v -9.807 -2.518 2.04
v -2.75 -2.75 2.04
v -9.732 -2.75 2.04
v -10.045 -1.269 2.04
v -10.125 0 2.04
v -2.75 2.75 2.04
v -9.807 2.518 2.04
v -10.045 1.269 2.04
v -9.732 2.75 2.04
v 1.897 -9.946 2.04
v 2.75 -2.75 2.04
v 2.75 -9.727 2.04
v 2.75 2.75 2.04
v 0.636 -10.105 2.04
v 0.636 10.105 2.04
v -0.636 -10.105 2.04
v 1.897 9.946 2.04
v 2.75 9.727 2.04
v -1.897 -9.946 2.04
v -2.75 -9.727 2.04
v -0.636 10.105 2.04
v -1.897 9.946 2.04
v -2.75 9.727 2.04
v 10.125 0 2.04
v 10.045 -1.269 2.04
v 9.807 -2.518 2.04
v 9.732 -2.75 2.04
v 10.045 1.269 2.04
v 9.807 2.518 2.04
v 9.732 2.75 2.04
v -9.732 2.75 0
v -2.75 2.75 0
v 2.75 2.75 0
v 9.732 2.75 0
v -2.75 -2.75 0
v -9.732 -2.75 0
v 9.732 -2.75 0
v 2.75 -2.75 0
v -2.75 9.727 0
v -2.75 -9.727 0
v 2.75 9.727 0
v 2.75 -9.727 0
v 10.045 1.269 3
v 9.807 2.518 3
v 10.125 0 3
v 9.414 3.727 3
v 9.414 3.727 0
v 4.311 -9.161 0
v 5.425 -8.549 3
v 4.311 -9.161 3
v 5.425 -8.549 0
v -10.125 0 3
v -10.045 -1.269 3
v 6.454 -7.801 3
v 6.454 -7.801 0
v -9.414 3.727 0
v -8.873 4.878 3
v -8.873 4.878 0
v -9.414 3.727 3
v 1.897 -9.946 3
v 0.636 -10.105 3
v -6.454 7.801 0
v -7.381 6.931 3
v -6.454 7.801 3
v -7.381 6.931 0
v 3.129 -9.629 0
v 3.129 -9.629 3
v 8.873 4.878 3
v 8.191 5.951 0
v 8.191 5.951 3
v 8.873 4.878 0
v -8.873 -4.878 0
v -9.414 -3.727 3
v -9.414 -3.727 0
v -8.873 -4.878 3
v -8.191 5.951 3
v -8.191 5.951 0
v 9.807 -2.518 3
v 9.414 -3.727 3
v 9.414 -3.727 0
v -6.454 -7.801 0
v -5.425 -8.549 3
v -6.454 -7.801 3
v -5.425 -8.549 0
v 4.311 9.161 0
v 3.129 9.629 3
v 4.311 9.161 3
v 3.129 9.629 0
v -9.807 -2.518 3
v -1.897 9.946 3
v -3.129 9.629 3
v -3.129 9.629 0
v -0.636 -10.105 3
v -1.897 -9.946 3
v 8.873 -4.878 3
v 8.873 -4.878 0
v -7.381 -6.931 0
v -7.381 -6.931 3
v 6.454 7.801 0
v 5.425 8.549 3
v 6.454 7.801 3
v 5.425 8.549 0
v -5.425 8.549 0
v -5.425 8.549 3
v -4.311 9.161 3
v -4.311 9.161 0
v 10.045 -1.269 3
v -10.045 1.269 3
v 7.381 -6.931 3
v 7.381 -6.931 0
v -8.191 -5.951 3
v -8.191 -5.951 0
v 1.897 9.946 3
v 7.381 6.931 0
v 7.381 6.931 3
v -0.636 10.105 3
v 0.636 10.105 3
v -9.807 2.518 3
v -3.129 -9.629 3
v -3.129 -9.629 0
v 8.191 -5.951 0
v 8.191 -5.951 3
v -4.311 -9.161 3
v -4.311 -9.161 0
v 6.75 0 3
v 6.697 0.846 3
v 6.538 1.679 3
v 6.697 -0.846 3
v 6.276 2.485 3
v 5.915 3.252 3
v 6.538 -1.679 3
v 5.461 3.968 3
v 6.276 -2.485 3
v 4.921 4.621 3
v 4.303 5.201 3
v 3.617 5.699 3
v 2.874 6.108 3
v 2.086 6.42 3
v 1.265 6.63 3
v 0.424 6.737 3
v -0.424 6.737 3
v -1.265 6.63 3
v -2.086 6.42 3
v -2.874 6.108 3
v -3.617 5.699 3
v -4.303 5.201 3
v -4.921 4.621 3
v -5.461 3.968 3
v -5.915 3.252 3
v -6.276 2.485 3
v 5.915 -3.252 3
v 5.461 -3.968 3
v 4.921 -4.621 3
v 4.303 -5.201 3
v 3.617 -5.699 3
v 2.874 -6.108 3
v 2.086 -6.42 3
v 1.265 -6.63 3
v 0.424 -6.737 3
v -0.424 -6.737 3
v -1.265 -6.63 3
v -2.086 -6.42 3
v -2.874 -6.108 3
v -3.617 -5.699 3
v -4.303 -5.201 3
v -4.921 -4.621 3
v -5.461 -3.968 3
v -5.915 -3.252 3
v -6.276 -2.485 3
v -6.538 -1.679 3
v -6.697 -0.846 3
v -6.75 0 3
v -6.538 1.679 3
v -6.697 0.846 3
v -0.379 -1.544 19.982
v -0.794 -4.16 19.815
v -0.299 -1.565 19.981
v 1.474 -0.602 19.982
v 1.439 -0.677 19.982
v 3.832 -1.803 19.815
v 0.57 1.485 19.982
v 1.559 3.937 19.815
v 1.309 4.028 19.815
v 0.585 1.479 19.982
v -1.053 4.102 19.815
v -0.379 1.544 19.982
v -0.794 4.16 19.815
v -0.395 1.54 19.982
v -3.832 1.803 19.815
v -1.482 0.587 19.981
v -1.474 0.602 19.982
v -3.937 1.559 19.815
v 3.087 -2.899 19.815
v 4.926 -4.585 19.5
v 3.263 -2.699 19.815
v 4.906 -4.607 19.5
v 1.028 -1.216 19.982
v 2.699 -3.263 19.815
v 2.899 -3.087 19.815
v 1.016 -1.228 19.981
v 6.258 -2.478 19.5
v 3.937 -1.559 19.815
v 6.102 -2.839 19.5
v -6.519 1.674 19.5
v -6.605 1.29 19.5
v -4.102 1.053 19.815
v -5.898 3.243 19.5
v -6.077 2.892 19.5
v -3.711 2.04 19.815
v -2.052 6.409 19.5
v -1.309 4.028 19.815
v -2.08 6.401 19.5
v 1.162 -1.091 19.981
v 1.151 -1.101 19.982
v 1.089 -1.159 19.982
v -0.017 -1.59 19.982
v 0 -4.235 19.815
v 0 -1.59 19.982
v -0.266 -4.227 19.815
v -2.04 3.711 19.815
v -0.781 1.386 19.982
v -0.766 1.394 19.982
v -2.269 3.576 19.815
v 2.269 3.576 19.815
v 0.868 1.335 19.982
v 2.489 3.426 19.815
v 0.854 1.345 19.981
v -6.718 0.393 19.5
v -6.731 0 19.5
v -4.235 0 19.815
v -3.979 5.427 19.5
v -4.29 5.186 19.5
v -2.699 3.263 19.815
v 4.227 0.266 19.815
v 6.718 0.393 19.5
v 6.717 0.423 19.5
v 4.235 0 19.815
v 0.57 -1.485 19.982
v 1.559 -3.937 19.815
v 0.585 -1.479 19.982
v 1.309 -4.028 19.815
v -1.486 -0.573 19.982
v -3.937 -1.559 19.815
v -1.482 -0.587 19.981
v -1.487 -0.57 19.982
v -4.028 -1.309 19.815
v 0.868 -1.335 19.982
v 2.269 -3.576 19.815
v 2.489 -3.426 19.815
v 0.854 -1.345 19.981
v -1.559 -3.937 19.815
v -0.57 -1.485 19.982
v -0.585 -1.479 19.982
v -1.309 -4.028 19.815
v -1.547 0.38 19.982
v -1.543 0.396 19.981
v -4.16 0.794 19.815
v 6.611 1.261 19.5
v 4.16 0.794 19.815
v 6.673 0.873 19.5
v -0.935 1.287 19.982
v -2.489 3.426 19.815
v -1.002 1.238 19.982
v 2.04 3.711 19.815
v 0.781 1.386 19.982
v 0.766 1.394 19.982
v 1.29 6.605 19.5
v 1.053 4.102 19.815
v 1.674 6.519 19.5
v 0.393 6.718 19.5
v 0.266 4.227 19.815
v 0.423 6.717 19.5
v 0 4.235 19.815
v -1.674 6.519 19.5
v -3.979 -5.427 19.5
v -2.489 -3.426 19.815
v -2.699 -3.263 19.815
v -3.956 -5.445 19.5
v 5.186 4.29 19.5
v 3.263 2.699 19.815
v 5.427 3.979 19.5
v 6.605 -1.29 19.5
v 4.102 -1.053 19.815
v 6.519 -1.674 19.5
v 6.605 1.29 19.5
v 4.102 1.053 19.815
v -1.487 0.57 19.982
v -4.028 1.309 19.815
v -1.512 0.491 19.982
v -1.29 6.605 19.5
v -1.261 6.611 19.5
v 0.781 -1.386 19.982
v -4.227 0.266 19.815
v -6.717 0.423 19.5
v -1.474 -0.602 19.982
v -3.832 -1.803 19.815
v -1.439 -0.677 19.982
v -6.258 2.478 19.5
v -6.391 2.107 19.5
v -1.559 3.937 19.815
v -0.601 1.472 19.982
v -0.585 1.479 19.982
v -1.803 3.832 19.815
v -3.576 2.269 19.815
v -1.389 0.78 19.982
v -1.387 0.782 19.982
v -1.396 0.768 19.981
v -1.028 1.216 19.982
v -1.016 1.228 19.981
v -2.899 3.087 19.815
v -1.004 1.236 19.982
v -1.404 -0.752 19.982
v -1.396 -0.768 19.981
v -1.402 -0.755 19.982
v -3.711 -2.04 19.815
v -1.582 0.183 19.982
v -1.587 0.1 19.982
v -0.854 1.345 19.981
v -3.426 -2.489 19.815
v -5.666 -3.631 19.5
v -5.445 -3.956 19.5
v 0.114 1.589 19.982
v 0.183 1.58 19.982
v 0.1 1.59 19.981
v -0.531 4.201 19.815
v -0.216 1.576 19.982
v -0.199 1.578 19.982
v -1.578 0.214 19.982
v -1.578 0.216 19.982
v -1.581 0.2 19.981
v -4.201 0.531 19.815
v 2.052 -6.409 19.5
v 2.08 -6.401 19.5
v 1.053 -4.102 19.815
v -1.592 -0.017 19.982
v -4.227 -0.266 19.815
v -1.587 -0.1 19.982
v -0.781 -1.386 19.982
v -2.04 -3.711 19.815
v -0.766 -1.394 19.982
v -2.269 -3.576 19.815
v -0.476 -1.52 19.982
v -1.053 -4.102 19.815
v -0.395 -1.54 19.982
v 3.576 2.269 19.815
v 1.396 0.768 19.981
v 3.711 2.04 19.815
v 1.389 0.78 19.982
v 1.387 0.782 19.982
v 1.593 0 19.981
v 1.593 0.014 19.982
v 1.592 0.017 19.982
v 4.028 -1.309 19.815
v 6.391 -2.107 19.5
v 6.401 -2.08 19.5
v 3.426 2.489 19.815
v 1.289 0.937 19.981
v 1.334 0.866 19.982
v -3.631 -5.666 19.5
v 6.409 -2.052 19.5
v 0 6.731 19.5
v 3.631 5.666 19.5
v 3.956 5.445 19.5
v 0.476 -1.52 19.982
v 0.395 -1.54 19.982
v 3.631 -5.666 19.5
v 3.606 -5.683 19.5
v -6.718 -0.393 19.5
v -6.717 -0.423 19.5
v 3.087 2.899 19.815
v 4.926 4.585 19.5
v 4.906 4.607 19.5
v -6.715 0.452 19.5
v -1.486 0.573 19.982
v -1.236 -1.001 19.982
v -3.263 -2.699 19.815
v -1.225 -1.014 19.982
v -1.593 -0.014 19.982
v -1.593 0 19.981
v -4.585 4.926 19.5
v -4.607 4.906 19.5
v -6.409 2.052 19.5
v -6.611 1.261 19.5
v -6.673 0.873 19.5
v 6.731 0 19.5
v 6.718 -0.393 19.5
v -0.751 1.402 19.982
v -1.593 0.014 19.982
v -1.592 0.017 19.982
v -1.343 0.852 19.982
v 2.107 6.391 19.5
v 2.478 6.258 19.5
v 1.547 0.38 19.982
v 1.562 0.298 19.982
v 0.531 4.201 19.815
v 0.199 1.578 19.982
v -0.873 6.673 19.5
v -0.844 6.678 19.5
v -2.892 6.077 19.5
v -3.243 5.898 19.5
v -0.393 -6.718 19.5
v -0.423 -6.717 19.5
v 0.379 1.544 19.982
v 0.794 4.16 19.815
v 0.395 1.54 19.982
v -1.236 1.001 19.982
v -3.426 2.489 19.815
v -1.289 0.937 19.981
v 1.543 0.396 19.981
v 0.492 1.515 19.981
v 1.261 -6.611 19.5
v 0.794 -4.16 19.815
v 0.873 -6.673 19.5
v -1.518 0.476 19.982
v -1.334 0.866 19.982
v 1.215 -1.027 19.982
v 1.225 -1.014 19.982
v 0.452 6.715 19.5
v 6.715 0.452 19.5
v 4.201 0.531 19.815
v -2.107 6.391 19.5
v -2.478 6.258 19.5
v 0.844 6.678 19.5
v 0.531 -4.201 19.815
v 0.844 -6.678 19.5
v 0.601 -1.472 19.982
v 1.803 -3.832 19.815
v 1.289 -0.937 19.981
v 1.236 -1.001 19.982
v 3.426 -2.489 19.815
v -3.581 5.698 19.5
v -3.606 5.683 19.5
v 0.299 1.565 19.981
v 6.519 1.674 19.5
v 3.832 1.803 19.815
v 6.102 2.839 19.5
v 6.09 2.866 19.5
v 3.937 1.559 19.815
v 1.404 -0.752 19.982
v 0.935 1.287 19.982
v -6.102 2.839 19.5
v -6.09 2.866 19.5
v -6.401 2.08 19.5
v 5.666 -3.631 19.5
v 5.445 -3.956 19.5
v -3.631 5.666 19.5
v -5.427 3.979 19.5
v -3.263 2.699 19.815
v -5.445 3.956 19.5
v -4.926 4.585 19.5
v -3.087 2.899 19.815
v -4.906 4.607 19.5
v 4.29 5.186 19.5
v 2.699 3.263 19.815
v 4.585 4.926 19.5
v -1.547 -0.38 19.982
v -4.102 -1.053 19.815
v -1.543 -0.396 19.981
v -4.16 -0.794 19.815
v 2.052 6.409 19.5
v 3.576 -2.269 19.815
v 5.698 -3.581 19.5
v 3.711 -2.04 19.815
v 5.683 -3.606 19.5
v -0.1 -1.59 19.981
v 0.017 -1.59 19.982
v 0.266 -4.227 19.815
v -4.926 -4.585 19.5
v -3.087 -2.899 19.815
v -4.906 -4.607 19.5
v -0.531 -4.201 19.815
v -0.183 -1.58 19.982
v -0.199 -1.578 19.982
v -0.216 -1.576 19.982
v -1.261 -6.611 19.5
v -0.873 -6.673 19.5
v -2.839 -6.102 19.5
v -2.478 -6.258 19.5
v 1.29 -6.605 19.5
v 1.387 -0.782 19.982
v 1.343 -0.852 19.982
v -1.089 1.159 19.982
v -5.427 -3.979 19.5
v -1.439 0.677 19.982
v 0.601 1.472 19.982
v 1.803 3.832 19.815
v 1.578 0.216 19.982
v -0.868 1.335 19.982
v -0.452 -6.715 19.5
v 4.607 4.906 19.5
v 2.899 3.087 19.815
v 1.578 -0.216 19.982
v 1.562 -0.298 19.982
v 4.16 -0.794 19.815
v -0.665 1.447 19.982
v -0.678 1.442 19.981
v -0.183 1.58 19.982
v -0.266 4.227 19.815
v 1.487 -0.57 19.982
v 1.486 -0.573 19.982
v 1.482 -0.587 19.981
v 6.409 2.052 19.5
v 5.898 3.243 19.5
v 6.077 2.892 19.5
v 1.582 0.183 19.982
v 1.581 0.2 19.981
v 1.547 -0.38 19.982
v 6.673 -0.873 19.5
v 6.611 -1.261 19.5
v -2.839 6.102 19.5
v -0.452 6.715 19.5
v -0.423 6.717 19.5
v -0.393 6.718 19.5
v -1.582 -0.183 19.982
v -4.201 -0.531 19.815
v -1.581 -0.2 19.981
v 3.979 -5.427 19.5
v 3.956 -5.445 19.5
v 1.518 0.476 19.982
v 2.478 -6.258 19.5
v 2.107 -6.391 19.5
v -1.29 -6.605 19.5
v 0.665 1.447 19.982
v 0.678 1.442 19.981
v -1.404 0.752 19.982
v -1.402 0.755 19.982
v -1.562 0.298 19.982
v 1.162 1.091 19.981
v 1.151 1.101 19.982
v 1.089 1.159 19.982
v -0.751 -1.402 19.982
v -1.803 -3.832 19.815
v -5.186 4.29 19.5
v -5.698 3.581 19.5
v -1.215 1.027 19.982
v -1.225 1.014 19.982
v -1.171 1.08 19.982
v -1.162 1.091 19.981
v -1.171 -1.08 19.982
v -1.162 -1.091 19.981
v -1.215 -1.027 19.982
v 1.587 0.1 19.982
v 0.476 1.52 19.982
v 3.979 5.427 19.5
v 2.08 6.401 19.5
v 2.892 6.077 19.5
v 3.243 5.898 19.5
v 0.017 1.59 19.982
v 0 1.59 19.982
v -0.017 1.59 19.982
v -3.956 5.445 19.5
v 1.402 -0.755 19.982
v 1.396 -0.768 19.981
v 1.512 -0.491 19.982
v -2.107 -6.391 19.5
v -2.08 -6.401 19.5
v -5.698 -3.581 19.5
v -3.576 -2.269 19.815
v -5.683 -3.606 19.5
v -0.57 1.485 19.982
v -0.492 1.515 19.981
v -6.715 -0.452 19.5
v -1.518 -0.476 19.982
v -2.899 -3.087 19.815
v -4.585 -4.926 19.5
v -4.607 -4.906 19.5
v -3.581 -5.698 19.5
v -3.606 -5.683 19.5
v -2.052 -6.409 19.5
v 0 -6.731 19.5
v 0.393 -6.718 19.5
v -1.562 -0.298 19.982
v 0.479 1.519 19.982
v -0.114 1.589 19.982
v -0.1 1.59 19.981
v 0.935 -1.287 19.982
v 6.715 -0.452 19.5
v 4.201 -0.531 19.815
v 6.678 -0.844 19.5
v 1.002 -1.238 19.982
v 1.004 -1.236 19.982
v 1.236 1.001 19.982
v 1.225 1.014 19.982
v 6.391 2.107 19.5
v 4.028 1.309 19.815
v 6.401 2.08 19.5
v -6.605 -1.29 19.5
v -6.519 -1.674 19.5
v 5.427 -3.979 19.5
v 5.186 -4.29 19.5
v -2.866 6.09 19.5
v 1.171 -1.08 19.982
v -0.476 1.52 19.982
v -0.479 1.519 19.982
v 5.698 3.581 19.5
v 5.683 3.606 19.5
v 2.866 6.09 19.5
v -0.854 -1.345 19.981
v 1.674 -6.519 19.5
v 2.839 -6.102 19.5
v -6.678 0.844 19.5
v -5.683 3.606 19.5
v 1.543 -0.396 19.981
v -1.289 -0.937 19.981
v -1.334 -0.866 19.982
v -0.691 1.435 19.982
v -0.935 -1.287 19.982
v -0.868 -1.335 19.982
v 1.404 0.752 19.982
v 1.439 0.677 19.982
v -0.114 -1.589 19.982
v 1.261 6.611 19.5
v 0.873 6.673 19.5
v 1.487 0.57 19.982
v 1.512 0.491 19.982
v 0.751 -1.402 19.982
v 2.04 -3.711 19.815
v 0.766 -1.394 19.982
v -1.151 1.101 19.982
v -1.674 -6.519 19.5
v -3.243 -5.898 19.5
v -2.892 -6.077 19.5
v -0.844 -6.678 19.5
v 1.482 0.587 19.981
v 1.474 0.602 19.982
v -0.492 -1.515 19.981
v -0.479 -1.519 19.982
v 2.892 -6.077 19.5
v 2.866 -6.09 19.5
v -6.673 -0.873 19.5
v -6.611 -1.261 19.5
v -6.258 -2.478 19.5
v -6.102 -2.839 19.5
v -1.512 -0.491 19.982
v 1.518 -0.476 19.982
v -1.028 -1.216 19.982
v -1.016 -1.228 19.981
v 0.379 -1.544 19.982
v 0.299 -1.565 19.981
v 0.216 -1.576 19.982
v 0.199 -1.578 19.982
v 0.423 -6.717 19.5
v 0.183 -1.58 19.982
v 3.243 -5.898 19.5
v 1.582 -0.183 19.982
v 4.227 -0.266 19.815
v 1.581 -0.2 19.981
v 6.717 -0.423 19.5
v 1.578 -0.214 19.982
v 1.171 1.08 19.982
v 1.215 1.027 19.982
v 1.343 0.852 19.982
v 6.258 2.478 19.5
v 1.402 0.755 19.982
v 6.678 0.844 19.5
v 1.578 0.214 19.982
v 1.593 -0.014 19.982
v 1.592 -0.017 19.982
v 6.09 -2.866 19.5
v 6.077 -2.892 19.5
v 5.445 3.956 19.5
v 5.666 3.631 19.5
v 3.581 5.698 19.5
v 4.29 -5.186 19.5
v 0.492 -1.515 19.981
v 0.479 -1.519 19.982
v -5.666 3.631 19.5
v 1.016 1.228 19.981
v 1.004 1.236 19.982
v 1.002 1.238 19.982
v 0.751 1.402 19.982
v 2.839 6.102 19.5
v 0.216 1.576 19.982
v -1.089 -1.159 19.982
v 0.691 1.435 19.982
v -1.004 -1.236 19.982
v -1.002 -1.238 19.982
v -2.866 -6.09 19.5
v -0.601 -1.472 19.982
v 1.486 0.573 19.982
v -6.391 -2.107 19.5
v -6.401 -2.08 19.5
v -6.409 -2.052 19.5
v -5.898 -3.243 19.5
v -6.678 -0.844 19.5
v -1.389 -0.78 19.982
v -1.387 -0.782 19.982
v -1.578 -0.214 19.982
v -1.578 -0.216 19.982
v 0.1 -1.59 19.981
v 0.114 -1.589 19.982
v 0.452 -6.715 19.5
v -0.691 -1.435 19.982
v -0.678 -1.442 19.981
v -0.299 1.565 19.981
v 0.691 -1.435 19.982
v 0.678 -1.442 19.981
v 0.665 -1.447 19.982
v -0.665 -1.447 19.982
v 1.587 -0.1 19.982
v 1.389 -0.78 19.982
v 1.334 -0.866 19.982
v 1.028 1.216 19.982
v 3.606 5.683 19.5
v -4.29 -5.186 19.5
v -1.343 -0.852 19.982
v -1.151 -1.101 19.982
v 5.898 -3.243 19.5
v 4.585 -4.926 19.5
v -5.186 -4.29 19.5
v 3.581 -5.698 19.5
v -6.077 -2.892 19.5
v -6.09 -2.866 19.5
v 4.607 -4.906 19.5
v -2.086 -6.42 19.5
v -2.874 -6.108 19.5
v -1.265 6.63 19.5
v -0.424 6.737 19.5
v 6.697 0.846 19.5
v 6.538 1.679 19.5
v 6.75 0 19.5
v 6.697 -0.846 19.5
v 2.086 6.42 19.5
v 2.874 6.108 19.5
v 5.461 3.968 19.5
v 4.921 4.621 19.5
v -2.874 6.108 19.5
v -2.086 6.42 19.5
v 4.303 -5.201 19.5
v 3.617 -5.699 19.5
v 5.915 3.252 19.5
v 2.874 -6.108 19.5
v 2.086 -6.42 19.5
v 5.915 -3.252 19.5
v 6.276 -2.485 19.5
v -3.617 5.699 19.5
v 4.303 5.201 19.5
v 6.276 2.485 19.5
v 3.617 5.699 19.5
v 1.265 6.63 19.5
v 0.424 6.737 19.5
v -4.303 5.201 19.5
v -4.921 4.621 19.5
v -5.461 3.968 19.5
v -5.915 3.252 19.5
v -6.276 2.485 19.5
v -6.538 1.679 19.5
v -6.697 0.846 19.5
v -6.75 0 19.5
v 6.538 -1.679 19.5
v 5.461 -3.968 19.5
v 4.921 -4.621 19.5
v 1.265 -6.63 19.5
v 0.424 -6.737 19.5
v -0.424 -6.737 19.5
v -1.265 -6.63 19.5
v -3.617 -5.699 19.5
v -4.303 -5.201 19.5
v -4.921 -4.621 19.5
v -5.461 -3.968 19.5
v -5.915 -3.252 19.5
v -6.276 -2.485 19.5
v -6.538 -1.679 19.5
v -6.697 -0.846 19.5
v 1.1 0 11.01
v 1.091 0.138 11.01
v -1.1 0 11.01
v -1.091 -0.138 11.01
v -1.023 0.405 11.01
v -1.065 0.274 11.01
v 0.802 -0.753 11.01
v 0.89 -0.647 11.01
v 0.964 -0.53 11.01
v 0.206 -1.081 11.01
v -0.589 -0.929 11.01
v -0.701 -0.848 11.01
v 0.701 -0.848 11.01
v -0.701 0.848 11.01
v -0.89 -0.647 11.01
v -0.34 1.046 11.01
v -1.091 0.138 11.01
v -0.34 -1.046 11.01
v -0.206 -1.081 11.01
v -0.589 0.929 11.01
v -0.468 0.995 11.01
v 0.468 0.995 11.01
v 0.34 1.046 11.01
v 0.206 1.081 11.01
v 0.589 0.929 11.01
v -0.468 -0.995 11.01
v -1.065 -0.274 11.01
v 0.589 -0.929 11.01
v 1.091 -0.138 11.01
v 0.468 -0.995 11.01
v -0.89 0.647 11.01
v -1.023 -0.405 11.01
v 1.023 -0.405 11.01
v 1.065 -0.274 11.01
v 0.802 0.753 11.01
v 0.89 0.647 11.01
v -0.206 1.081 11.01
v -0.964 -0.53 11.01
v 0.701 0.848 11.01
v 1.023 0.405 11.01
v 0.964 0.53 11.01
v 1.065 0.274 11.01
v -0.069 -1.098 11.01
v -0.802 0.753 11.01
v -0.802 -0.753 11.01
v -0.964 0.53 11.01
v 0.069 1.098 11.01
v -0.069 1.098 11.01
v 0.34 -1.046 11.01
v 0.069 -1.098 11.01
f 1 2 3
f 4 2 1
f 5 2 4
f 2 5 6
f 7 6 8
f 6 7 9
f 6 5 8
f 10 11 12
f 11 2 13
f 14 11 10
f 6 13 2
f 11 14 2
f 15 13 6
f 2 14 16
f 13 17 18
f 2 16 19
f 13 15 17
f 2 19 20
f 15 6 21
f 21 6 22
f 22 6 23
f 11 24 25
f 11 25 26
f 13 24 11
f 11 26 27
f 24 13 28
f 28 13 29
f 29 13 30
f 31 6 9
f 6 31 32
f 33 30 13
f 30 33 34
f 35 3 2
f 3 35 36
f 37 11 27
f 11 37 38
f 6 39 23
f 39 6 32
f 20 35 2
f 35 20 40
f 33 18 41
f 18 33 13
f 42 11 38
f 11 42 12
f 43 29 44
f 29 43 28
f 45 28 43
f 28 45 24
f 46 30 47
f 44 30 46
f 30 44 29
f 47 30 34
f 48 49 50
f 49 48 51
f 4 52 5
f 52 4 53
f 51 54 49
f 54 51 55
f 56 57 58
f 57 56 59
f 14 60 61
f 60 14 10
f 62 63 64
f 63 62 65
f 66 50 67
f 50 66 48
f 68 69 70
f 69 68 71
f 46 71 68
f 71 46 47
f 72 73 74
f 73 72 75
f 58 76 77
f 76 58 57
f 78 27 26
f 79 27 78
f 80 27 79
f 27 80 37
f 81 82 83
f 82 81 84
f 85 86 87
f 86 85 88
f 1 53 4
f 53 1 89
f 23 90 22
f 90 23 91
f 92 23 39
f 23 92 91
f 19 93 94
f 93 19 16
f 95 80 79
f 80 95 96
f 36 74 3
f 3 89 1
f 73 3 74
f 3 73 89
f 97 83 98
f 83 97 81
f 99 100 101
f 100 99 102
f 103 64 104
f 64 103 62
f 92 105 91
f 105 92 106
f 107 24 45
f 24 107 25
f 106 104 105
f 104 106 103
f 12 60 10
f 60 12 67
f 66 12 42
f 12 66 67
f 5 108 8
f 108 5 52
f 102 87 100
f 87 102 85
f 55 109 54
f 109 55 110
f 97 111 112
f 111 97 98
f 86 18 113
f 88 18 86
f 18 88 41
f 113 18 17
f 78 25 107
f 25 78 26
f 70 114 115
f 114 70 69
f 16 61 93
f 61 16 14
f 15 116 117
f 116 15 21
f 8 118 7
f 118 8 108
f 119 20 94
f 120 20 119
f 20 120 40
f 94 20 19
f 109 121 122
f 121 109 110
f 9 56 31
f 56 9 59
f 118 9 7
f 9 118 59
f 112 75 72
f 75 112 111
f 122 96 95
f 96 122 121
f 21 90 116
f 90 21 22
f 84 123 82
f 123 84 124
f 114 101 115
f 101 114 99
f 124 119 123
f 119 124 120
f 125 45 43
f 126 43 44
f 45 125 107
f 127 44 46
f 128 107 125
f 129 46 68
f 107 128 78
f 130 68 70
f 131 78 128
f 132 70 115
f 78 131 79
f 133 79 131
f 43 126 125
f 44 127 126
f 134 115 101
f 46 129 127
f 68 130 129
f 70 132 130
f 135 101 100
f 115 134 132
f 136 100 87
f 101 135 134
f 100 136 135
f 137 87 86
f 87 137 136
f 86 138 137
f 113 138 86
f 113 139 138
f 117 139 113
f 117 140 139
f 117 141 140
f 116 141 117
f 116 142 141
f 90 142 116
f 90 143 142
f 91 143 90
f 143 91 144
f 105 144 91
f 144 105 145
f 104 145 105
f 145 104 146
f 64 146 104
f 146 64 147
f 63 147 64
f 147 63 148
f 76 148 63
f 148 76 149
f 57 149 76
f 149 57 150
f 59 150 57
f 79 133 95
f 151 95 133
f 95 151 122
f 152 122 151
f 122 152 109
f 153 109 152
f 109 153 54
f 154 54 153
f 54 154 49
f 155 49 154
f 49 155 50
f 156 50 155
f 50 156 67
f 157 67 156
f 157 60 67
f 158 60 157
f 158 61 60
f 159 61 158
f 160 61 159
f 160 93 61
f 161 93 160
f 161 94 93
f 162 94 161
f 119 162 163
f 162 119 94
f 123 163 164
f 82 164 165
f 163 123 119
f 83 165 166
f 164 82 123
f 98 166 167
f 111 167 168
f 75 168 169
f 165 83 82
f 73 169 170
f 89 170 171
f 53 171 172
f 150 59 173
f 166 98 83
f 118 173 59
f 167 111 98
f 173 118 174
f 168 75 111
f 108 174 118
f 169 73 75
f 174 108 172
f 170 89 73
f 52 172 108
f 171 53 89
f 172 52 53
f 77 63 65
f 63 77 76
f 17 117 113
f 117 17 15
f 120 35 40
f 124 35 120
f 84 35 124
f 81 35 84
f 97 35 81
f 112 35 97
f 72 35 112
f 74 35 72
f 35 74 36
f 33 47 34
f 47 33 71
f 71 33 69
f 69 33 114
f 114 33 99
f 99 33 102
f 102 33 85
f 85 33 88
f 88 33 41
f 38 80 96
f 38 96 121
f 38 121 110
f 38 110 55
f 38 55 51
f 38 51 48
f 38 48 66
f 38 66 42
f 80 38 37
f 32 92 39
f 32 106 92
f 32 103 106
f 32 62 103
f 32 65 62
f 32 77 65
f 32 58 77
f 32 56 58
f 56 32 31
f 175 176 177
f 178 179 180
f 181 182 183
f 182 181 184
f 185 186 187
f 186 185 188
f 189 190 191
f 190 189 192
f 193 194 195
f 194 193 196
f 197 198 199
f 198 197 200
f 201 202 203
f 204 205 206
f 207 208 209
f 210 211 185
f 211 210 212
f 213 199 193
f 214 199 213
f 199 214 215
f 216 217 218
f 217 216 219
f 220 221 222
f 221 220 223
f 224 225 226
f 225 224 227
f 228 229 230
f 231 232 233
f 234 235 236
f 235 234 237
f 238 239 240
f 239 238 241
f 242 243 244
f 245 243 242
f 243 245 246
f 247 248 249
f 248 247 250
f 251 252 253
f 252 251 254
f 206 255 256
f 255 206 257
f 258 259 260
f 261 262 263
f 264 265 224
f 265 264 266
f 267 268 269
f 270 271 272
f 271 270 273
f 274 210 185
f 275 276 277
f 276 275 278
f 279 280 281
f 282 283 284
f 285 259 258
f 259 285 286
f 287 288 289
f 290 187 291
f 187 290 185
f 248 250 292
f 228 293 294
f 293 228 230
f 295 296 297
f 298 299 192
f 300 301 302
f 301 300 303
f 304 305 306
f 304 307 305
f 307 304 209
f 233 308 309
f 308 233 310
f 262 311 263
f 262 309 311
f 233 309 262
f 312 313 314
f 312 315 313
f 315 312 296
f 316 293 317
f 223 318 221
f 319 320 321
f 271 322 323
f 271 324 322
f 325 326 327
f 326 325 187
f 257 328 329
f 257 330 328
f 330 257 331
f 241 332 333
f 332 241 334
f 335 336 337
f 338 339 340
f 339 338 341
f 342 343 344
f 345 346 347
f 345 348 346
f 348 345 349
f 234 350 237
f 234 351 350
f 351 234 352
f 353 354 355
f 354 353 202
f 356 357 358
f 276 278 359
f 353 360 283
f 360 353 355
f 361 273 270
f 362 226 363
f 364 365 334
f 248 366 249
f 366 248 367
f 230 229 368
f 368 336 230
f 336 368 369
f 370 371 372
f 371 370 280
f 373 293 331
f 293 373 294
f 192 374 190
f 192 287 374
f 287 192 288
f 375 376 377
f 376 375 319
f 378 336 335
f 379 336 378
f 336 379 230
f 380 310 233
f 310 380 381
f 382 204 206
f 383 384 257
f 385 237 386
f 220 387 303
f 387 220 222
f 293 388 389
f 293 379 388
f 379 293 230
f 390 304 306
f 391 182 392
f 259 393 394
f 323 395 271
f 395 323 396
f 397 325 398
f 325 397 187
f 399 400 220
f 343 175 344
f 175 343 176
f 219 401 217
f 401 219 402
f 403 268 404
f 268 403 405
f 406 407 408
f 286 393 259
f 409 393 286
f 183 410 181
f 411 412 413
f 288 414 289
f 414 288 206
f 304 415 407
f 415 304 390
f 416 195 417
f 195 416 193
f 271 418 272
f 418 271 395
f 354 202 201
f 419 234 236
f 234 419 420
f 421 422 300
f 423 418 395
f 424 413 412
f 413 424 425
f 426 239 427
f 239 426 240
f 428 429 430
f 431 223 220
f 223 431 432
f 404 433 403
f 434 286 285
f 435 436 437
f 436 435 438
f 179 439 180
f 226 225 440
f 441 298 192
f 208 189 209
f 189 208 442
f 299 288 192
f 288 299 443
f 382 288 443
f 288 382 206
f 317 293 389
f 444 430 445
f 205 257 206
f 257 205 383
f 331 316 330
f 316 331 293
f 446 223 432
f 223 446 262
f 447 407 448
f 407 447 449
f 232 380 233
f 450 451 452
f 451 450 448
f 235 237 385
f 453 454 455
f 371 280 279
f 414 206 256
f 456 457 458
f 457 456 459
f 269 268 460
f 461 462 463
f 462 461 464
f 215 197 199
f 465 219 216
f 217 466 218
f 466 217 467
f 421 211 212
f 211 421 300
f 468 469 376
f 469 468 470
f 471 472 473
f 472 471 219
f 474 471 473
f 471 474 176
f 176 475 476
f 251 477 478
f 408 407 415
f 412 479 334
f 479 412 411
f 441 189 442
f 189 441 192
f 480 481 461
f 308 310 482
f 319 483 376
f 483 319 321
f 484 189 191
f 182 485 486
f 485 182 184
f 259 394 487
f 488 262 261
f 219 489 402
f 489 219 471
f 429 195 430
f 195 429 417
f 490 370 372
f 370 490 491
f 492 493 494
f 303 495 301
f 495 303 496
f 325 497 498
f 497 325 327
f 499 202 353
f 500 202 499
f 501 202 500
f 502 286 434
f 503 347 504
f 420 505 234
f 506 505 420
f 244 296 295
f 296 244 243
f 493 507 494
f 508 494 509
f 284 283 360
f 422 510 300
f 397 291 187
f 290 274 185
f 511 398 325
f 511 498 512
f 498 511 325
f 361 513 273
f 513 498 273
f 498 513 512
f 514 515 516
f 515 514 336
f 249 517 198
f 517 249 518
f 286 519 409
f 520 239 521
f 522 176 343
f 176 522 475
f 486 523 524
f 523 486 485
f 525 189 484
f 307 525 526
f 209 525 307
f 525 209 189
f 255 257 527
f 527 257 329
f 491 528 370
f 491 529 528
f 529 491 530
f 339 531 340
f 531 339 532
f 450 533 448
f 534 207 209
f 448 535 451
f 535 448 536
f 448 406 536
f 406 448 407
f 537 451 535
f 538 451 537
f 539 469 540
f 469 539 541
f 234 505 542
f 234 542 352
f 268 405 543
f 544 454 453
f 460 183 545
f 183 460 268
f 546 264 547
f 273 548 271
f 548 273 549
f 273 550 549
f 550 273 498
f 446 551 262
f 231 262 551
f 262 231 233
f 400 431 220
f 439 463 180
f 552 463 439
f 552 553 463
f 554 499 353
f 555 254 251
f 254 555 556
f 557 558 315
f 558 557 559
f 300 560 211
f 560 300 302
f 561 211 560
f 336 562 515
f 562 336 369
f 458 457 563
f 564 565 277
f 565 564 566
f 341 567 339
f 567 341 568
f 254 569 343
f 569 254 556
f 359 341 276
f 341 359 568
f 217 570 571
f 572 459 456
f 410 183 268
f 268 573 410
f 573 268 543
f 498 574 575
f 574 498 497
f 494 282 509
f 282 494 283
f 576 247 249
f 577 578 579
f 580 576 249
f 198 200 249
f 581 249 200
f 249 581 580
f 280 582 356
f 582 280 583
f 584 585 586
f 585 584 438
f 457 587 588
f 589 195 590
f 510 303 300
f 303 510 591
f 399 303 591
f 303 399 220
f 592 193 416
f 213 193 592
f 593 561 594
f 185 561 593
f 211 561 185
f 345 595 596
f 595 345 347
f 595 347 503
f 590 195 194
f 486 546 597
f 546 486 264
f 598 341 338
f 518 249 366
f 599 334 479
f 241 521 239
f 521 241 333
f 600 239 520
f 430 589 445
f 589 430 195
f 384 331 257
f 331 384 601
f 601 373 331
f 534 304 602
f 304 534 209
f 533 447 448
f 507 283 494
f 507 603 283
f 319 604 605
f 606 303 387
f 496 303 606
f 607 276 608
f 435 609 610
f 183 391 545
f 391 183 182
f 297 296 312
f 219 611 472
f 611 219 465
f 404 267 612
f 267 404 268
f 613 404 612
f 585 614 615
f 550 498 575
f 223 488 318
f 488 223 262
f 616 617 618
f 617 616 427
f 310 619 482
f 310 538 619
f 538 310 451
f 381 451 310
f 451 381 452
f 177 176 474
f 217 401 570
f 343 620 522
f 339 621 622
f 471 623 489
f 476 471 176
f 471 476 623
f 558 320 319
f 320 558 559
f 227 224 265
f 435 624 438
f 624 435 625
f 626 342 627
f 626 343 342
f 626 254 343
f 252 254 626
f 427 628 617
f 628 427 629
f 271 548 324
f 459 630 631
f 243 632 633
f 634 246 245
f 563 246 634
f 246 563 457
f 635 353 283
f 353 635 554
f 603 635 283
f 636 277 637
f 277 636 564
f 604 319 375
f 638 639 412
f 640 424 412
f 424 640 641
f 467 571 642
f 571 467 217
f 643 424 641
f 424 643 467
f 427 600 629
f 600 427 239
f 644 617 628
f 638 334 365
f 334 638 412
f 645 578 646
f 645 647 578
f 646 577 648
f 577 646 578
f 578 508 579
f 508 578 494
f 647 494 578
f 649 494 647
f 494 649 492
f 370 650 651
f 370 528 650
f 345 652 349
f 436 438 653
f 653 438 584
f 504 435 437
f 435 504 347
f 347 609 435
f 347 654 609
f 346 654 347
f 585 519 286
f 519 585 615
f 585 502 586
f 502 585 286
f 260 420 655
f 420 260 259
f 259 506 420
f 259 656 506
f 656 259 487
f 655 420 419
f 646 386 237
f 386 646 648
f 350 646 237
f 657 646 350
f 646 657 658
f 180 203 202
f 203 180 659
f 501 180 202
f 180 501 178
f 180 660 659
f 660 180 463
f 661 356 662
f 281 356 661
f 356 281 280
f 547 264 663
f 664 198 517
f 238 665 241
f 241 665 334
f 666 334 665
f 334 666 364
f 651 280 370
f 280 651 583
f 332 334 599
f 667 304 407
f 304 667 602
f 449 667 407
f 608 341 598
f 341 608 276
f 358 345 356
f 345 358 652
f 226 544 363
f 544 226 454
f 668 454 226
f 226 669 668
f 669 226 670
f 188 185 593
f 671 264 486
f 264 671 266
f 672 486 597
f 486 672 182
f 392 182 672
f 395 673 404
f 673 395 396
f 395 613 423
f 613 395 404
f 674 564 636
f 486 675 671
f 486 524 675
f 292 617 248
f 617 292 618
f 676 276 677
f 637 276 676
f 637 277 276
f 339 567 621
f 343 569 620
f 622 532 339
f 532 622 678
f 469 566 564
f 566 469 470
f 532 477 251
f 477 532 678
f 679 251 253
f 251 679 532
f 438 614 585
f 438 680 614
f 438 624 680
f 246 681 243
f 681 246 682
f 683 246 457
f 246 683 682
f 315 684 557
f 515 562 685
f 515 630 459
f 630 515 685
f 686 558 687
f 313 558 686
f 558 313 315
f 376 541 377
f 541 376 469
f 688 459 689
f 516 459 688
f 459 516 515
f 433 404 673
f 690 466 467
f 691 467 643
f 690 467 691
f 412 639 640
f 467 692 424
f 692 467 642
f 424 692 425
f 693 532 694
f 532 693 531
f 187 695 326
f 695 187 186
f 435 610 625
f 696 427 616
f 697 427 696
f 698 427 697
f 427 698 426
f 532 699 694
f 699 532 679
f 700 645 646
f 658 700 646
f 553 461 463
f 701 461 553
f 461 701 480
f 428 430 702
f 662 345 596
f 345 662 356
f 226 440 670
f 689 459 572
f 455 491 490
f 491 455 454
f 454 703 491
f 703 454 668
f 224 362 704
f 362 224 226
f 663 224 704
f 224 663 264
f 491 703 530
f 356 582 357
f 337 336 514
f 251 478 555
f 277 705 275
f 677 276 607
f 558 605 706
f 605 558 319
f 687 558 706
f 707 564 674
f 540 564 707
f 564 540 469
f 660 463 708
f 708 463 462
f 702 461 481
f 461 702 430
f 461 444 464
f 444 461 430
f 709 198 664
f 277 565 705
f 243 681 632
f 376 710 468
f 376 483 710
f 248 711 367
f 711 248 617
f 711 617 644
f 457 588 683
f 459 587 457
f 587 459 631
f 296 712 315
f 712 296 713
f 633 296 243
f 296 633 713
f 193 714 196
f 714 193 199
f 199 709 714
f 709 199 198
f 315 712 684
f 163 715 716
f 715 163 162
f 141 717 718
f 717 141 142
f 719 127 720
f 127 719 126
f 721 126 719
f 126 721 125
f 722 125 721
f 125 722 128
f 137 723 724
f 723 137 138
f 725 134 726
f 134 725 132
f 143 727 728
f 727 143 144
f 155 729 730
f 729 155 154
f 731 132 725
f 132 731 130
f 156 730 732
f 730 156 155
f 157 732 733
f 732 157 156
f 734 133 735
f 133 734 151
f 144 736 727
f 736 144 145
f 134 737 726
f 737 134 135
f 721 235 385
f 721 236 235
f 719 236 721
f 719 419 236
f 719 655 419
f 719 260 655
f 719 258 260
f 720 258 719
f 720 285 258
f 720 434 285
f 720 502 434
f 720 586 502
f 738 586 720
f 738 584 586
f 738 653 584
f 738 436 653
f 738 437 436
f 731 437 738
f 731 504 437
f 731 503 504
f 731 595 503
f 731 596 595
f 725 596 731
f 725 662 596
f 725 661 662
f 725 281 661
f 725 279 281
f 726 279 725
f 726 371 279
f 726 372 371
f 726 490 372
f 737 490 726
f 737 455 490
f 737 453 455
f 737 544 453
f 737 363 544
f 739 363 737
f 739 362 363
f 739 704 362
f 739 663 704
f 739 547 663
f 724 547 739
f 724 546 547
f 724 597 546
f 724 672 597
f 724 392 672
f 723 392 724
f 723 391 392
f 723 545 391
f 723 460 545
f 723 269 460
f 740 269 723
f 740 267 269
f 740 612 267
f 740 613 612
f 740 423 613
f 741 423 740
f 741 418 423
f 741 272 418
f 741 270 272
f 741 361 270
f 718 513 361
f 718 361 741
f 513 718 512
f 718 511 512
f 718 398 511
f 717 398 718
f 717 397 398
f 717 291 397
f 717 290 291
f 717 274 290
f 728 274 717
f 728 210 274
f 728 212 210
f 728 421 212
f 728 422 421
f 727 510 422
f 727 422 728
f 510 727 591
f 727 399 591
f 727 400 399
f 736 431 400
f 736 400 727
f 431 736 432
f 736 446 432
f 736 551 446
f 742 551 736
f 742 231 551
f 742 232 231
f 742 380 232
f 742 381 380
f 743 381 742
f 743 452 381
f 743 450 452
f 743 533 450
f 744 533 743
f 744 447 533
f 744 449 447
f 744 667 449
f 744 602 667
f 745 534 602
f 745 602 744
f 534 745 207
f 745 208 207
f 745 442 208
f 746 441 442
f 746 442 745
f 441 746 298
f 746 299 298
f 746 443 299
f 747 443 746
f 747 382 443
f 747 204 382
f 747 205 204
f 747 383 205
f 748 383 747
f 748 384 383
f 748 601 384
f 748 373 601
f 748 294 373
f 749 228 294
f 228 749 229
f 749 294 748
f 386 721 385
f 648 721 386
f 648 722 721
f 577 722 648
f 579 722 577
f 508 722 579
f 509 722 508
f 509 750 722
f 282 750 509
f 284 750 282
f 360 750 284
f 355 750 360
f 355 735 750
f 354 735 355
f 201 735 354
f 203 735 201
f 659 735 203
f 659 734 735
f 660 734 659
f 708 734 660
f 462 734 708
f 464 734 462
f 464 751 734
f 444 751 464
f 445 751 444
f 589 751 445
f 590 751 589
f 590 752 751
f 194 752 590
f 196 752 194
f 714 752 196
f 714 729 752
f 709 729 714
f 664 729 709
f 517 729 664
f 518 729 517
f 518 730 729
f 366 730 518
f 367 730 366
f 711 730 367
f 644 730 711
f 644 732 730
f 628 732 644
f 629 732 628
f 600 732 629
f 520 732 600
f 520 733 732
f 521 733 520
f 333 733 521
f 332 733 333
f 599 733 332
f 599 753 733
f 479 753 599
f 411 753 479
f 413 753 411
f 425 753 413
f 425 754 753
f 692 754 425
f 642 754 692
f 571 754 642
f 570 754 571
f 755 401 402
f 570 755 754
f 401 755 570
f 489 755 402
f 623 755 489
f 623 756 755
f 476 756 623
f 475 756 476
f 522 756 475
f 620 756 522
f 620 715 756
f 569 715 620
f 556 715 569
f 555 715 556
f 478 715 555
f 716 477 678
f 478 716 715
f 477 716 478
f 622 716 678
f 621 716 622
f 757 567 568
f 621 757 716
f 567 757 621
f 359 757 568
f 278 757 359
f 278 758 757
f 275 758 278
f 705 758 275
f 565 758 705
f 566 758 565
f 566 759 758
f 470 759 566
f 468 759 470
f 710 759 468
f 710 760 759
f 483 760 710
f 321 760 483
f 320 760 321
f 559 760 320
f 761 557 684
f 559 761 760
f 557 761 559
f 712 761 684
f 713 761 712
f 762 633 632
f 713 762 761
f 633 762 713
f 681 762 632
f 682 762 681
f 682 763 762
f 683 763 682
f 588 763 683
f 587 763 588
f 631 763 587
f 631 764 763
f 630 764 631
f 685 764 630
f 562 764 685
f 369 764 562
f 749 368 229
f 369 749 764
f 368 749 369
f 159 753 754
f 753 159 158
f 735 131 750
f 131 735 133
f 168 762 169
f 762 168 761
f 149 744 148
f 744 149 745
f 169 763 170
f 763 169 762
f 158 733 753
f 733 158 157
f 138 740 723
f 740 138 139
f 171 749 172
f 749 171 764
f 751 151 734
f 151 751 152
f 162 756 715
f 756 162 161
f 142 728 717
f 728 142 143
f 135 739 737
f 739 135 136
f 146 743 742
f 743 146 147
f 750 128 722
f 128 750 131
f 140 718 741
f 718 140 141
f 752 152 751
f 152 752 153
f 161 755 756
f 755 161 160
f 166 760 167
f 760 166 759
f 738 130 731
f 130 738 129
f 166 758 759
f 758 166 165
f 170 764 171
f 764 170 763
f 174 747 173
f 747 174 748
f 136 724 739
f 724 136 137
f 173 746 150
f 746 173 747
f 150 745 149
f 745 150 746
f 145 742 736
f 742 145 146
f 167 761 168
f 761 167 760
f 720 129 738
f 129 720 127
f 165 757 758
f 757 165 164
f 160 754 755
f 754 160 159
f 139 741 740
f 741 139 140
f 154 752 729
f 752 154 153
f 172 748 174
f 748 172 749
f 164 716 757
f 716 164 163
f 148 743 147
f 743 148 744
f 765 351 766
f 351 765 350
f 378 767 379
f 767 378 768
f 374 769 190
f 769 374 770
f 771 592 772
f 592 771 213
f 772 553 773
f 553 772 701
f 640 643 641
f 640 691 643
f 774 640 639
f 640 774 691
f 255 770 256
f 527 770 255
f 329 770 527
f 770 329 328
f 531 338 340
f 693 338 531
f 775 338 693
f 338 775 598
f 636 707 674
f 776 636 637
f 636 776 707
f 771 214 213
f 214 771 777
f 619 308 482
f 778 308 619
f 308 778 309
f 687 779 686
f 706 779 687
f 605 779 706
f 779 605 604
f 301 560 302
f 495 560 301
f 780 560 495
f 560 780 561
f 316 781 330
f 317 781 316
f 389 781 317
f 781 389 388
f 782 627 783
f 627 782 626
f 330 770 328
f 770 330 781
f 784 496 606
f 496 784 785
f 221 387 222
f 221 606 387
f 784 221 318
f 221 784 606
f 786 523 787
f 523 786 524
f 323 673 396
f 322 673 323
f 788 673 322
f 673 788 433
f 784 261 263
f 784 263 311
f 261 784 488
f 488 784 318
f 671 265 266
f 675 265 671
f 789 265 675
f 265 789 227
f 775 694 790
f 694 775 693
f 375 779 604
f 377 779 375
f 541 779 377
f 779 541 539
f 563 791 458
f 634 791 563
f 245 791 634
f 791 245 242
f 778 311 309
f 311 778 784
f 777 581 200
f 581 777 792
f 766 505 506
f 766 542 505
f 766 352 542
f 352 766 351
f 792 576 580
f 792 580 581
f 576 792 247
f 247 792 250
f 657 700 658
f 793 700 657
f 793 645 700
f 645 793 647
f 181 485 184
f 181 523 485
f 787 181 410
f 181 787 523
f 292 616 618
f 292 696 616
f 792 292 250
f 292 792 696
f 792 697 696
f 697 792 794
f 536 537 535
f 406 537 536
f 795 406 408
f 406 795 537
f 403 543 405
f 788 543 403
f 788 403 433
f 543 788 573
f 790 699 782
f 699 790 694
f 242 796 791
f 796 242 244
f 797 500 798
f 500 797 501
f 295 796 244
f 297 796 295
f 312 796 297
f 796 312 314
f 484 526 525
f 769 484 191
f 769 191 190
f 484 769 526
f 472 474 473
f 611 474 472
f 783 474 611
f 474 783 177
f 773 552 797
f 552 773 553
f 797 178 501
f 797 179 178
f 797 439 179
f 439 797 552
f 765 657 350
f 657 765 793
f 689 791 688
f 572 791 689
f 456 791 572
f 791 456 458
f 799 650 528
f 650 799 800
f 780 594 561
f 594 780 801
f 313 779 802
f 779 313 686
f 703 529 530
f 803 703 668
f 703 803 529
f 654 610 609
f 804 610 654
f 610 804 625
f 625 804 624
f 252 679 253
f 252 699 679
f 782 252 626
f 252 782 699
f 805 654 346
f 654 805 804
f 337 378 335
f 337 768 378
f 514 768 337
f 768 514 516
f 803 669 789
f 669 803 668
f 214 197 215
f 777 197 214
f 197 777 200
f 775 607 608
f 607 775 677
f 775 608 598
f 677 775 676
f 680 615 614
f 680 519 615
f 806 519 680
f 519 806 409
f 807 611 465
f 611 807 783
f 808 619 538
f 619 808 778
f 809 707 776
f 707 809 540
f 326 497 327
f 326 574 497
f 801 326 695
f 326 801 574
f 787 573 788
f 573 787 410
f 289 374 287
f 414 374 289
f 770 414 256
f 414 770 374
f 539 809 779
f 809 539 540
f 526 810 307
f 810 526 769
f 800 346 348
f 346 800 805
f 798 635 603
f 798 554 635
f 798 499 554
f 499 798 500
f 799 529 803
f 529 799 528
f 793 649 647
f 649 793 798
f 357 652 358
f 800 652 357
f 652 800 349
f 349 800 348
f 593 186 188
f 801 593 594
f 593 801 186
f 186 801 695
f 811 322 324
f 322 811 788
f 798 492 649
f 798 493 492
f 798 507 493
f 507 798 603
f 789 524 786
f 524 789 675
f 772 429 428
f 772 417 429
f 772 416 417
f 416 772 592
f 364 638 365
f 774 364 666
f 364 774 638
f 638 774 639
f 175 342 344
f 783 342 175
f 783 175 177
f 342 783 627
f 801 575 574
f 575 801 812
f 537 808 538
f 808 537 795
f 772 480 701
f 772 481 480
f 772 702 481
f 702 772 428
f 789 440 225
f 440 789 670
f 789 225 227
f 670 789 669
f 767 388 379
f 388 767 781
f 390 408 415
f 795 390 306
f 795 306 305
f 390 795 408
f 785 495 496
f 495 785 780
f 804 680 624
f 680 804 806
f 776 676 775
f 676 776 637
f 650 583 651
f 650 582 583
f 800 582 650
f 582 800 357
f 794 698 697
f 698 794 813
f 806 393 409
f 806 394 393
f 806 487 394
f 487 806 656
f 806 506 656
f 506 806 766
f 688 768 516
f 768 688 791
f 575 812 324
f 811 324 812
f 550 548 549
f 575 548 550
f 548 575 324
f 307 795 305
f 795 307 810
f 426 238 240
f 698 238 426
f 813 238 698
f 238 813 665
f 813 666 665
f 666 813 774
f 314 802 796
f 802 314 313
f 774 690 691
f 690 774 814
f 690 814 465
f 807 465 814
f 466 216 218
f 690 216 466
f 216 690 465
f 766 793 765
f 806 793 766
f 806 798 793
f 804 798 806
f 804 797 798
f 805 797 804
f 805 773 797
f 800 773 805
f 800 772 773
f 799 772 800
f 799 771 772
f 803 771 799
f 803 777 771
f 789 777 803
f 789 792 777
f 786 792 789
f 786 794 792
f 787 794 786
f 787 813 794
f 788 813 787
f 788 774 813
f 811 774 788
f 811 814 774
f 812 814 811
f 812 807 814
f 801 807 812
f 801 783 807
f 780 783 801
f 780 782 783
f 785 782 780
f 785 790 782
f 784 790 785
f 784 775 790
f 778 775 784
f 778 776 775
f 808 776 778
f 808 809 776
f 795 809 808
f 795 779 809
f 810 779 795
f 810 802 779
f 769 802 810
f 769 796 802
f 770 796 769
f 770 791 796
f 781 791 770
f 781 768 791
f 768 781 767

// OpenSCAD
height = 19.5;
head_radius = 90 / 2;
hole_radius = 13.5 / 2;
motor_arm_cuts = 4;
cutwidth = 5.5;
cutdepth = 2.05;

$fn = 100;

xbot_head_spacer(height, hole_radius, head_radius, motor_arm_cuts, cutwidth, cutdepth);

module xbot_head_spacer(mh, hr, topr, numcut, cutw, cutd) {
	difference() {
	union() {
	difference() {
		cylinder(r = hr * 1.5, h = 3, center = false, $fn = 50);
		for (i = [0 : numcut - 1]) {
			rotate([0, 0, i * 90])
			translate([(hr) / 2, 0, cutd / 2 - 0.01]) cube([hr * 2, cutw, cutd], center=true);
		}
	}
	//midsection
	translate([0, 0, 3 - 0.01])
		cylinder(r = hr, h = mh - 3 + 0.01, center = false, $fn = 50);
	// round end
	translate([0, 0, -topr + 0.515]) difference() {
		translate([0, 0, mh]) sphere(r = topr);
		translate([0, 0, mh - 0.515]) cube([topr * 2, topr * 2, topr * 2], center=true);
	}
	}
	// set screw
	translate([0, 0, mh - 10 + 1.51]) 
		cylinder(r1 = 1.1, r2 = 1.65, h = 10, center = false, $fn=50);
	}
}
